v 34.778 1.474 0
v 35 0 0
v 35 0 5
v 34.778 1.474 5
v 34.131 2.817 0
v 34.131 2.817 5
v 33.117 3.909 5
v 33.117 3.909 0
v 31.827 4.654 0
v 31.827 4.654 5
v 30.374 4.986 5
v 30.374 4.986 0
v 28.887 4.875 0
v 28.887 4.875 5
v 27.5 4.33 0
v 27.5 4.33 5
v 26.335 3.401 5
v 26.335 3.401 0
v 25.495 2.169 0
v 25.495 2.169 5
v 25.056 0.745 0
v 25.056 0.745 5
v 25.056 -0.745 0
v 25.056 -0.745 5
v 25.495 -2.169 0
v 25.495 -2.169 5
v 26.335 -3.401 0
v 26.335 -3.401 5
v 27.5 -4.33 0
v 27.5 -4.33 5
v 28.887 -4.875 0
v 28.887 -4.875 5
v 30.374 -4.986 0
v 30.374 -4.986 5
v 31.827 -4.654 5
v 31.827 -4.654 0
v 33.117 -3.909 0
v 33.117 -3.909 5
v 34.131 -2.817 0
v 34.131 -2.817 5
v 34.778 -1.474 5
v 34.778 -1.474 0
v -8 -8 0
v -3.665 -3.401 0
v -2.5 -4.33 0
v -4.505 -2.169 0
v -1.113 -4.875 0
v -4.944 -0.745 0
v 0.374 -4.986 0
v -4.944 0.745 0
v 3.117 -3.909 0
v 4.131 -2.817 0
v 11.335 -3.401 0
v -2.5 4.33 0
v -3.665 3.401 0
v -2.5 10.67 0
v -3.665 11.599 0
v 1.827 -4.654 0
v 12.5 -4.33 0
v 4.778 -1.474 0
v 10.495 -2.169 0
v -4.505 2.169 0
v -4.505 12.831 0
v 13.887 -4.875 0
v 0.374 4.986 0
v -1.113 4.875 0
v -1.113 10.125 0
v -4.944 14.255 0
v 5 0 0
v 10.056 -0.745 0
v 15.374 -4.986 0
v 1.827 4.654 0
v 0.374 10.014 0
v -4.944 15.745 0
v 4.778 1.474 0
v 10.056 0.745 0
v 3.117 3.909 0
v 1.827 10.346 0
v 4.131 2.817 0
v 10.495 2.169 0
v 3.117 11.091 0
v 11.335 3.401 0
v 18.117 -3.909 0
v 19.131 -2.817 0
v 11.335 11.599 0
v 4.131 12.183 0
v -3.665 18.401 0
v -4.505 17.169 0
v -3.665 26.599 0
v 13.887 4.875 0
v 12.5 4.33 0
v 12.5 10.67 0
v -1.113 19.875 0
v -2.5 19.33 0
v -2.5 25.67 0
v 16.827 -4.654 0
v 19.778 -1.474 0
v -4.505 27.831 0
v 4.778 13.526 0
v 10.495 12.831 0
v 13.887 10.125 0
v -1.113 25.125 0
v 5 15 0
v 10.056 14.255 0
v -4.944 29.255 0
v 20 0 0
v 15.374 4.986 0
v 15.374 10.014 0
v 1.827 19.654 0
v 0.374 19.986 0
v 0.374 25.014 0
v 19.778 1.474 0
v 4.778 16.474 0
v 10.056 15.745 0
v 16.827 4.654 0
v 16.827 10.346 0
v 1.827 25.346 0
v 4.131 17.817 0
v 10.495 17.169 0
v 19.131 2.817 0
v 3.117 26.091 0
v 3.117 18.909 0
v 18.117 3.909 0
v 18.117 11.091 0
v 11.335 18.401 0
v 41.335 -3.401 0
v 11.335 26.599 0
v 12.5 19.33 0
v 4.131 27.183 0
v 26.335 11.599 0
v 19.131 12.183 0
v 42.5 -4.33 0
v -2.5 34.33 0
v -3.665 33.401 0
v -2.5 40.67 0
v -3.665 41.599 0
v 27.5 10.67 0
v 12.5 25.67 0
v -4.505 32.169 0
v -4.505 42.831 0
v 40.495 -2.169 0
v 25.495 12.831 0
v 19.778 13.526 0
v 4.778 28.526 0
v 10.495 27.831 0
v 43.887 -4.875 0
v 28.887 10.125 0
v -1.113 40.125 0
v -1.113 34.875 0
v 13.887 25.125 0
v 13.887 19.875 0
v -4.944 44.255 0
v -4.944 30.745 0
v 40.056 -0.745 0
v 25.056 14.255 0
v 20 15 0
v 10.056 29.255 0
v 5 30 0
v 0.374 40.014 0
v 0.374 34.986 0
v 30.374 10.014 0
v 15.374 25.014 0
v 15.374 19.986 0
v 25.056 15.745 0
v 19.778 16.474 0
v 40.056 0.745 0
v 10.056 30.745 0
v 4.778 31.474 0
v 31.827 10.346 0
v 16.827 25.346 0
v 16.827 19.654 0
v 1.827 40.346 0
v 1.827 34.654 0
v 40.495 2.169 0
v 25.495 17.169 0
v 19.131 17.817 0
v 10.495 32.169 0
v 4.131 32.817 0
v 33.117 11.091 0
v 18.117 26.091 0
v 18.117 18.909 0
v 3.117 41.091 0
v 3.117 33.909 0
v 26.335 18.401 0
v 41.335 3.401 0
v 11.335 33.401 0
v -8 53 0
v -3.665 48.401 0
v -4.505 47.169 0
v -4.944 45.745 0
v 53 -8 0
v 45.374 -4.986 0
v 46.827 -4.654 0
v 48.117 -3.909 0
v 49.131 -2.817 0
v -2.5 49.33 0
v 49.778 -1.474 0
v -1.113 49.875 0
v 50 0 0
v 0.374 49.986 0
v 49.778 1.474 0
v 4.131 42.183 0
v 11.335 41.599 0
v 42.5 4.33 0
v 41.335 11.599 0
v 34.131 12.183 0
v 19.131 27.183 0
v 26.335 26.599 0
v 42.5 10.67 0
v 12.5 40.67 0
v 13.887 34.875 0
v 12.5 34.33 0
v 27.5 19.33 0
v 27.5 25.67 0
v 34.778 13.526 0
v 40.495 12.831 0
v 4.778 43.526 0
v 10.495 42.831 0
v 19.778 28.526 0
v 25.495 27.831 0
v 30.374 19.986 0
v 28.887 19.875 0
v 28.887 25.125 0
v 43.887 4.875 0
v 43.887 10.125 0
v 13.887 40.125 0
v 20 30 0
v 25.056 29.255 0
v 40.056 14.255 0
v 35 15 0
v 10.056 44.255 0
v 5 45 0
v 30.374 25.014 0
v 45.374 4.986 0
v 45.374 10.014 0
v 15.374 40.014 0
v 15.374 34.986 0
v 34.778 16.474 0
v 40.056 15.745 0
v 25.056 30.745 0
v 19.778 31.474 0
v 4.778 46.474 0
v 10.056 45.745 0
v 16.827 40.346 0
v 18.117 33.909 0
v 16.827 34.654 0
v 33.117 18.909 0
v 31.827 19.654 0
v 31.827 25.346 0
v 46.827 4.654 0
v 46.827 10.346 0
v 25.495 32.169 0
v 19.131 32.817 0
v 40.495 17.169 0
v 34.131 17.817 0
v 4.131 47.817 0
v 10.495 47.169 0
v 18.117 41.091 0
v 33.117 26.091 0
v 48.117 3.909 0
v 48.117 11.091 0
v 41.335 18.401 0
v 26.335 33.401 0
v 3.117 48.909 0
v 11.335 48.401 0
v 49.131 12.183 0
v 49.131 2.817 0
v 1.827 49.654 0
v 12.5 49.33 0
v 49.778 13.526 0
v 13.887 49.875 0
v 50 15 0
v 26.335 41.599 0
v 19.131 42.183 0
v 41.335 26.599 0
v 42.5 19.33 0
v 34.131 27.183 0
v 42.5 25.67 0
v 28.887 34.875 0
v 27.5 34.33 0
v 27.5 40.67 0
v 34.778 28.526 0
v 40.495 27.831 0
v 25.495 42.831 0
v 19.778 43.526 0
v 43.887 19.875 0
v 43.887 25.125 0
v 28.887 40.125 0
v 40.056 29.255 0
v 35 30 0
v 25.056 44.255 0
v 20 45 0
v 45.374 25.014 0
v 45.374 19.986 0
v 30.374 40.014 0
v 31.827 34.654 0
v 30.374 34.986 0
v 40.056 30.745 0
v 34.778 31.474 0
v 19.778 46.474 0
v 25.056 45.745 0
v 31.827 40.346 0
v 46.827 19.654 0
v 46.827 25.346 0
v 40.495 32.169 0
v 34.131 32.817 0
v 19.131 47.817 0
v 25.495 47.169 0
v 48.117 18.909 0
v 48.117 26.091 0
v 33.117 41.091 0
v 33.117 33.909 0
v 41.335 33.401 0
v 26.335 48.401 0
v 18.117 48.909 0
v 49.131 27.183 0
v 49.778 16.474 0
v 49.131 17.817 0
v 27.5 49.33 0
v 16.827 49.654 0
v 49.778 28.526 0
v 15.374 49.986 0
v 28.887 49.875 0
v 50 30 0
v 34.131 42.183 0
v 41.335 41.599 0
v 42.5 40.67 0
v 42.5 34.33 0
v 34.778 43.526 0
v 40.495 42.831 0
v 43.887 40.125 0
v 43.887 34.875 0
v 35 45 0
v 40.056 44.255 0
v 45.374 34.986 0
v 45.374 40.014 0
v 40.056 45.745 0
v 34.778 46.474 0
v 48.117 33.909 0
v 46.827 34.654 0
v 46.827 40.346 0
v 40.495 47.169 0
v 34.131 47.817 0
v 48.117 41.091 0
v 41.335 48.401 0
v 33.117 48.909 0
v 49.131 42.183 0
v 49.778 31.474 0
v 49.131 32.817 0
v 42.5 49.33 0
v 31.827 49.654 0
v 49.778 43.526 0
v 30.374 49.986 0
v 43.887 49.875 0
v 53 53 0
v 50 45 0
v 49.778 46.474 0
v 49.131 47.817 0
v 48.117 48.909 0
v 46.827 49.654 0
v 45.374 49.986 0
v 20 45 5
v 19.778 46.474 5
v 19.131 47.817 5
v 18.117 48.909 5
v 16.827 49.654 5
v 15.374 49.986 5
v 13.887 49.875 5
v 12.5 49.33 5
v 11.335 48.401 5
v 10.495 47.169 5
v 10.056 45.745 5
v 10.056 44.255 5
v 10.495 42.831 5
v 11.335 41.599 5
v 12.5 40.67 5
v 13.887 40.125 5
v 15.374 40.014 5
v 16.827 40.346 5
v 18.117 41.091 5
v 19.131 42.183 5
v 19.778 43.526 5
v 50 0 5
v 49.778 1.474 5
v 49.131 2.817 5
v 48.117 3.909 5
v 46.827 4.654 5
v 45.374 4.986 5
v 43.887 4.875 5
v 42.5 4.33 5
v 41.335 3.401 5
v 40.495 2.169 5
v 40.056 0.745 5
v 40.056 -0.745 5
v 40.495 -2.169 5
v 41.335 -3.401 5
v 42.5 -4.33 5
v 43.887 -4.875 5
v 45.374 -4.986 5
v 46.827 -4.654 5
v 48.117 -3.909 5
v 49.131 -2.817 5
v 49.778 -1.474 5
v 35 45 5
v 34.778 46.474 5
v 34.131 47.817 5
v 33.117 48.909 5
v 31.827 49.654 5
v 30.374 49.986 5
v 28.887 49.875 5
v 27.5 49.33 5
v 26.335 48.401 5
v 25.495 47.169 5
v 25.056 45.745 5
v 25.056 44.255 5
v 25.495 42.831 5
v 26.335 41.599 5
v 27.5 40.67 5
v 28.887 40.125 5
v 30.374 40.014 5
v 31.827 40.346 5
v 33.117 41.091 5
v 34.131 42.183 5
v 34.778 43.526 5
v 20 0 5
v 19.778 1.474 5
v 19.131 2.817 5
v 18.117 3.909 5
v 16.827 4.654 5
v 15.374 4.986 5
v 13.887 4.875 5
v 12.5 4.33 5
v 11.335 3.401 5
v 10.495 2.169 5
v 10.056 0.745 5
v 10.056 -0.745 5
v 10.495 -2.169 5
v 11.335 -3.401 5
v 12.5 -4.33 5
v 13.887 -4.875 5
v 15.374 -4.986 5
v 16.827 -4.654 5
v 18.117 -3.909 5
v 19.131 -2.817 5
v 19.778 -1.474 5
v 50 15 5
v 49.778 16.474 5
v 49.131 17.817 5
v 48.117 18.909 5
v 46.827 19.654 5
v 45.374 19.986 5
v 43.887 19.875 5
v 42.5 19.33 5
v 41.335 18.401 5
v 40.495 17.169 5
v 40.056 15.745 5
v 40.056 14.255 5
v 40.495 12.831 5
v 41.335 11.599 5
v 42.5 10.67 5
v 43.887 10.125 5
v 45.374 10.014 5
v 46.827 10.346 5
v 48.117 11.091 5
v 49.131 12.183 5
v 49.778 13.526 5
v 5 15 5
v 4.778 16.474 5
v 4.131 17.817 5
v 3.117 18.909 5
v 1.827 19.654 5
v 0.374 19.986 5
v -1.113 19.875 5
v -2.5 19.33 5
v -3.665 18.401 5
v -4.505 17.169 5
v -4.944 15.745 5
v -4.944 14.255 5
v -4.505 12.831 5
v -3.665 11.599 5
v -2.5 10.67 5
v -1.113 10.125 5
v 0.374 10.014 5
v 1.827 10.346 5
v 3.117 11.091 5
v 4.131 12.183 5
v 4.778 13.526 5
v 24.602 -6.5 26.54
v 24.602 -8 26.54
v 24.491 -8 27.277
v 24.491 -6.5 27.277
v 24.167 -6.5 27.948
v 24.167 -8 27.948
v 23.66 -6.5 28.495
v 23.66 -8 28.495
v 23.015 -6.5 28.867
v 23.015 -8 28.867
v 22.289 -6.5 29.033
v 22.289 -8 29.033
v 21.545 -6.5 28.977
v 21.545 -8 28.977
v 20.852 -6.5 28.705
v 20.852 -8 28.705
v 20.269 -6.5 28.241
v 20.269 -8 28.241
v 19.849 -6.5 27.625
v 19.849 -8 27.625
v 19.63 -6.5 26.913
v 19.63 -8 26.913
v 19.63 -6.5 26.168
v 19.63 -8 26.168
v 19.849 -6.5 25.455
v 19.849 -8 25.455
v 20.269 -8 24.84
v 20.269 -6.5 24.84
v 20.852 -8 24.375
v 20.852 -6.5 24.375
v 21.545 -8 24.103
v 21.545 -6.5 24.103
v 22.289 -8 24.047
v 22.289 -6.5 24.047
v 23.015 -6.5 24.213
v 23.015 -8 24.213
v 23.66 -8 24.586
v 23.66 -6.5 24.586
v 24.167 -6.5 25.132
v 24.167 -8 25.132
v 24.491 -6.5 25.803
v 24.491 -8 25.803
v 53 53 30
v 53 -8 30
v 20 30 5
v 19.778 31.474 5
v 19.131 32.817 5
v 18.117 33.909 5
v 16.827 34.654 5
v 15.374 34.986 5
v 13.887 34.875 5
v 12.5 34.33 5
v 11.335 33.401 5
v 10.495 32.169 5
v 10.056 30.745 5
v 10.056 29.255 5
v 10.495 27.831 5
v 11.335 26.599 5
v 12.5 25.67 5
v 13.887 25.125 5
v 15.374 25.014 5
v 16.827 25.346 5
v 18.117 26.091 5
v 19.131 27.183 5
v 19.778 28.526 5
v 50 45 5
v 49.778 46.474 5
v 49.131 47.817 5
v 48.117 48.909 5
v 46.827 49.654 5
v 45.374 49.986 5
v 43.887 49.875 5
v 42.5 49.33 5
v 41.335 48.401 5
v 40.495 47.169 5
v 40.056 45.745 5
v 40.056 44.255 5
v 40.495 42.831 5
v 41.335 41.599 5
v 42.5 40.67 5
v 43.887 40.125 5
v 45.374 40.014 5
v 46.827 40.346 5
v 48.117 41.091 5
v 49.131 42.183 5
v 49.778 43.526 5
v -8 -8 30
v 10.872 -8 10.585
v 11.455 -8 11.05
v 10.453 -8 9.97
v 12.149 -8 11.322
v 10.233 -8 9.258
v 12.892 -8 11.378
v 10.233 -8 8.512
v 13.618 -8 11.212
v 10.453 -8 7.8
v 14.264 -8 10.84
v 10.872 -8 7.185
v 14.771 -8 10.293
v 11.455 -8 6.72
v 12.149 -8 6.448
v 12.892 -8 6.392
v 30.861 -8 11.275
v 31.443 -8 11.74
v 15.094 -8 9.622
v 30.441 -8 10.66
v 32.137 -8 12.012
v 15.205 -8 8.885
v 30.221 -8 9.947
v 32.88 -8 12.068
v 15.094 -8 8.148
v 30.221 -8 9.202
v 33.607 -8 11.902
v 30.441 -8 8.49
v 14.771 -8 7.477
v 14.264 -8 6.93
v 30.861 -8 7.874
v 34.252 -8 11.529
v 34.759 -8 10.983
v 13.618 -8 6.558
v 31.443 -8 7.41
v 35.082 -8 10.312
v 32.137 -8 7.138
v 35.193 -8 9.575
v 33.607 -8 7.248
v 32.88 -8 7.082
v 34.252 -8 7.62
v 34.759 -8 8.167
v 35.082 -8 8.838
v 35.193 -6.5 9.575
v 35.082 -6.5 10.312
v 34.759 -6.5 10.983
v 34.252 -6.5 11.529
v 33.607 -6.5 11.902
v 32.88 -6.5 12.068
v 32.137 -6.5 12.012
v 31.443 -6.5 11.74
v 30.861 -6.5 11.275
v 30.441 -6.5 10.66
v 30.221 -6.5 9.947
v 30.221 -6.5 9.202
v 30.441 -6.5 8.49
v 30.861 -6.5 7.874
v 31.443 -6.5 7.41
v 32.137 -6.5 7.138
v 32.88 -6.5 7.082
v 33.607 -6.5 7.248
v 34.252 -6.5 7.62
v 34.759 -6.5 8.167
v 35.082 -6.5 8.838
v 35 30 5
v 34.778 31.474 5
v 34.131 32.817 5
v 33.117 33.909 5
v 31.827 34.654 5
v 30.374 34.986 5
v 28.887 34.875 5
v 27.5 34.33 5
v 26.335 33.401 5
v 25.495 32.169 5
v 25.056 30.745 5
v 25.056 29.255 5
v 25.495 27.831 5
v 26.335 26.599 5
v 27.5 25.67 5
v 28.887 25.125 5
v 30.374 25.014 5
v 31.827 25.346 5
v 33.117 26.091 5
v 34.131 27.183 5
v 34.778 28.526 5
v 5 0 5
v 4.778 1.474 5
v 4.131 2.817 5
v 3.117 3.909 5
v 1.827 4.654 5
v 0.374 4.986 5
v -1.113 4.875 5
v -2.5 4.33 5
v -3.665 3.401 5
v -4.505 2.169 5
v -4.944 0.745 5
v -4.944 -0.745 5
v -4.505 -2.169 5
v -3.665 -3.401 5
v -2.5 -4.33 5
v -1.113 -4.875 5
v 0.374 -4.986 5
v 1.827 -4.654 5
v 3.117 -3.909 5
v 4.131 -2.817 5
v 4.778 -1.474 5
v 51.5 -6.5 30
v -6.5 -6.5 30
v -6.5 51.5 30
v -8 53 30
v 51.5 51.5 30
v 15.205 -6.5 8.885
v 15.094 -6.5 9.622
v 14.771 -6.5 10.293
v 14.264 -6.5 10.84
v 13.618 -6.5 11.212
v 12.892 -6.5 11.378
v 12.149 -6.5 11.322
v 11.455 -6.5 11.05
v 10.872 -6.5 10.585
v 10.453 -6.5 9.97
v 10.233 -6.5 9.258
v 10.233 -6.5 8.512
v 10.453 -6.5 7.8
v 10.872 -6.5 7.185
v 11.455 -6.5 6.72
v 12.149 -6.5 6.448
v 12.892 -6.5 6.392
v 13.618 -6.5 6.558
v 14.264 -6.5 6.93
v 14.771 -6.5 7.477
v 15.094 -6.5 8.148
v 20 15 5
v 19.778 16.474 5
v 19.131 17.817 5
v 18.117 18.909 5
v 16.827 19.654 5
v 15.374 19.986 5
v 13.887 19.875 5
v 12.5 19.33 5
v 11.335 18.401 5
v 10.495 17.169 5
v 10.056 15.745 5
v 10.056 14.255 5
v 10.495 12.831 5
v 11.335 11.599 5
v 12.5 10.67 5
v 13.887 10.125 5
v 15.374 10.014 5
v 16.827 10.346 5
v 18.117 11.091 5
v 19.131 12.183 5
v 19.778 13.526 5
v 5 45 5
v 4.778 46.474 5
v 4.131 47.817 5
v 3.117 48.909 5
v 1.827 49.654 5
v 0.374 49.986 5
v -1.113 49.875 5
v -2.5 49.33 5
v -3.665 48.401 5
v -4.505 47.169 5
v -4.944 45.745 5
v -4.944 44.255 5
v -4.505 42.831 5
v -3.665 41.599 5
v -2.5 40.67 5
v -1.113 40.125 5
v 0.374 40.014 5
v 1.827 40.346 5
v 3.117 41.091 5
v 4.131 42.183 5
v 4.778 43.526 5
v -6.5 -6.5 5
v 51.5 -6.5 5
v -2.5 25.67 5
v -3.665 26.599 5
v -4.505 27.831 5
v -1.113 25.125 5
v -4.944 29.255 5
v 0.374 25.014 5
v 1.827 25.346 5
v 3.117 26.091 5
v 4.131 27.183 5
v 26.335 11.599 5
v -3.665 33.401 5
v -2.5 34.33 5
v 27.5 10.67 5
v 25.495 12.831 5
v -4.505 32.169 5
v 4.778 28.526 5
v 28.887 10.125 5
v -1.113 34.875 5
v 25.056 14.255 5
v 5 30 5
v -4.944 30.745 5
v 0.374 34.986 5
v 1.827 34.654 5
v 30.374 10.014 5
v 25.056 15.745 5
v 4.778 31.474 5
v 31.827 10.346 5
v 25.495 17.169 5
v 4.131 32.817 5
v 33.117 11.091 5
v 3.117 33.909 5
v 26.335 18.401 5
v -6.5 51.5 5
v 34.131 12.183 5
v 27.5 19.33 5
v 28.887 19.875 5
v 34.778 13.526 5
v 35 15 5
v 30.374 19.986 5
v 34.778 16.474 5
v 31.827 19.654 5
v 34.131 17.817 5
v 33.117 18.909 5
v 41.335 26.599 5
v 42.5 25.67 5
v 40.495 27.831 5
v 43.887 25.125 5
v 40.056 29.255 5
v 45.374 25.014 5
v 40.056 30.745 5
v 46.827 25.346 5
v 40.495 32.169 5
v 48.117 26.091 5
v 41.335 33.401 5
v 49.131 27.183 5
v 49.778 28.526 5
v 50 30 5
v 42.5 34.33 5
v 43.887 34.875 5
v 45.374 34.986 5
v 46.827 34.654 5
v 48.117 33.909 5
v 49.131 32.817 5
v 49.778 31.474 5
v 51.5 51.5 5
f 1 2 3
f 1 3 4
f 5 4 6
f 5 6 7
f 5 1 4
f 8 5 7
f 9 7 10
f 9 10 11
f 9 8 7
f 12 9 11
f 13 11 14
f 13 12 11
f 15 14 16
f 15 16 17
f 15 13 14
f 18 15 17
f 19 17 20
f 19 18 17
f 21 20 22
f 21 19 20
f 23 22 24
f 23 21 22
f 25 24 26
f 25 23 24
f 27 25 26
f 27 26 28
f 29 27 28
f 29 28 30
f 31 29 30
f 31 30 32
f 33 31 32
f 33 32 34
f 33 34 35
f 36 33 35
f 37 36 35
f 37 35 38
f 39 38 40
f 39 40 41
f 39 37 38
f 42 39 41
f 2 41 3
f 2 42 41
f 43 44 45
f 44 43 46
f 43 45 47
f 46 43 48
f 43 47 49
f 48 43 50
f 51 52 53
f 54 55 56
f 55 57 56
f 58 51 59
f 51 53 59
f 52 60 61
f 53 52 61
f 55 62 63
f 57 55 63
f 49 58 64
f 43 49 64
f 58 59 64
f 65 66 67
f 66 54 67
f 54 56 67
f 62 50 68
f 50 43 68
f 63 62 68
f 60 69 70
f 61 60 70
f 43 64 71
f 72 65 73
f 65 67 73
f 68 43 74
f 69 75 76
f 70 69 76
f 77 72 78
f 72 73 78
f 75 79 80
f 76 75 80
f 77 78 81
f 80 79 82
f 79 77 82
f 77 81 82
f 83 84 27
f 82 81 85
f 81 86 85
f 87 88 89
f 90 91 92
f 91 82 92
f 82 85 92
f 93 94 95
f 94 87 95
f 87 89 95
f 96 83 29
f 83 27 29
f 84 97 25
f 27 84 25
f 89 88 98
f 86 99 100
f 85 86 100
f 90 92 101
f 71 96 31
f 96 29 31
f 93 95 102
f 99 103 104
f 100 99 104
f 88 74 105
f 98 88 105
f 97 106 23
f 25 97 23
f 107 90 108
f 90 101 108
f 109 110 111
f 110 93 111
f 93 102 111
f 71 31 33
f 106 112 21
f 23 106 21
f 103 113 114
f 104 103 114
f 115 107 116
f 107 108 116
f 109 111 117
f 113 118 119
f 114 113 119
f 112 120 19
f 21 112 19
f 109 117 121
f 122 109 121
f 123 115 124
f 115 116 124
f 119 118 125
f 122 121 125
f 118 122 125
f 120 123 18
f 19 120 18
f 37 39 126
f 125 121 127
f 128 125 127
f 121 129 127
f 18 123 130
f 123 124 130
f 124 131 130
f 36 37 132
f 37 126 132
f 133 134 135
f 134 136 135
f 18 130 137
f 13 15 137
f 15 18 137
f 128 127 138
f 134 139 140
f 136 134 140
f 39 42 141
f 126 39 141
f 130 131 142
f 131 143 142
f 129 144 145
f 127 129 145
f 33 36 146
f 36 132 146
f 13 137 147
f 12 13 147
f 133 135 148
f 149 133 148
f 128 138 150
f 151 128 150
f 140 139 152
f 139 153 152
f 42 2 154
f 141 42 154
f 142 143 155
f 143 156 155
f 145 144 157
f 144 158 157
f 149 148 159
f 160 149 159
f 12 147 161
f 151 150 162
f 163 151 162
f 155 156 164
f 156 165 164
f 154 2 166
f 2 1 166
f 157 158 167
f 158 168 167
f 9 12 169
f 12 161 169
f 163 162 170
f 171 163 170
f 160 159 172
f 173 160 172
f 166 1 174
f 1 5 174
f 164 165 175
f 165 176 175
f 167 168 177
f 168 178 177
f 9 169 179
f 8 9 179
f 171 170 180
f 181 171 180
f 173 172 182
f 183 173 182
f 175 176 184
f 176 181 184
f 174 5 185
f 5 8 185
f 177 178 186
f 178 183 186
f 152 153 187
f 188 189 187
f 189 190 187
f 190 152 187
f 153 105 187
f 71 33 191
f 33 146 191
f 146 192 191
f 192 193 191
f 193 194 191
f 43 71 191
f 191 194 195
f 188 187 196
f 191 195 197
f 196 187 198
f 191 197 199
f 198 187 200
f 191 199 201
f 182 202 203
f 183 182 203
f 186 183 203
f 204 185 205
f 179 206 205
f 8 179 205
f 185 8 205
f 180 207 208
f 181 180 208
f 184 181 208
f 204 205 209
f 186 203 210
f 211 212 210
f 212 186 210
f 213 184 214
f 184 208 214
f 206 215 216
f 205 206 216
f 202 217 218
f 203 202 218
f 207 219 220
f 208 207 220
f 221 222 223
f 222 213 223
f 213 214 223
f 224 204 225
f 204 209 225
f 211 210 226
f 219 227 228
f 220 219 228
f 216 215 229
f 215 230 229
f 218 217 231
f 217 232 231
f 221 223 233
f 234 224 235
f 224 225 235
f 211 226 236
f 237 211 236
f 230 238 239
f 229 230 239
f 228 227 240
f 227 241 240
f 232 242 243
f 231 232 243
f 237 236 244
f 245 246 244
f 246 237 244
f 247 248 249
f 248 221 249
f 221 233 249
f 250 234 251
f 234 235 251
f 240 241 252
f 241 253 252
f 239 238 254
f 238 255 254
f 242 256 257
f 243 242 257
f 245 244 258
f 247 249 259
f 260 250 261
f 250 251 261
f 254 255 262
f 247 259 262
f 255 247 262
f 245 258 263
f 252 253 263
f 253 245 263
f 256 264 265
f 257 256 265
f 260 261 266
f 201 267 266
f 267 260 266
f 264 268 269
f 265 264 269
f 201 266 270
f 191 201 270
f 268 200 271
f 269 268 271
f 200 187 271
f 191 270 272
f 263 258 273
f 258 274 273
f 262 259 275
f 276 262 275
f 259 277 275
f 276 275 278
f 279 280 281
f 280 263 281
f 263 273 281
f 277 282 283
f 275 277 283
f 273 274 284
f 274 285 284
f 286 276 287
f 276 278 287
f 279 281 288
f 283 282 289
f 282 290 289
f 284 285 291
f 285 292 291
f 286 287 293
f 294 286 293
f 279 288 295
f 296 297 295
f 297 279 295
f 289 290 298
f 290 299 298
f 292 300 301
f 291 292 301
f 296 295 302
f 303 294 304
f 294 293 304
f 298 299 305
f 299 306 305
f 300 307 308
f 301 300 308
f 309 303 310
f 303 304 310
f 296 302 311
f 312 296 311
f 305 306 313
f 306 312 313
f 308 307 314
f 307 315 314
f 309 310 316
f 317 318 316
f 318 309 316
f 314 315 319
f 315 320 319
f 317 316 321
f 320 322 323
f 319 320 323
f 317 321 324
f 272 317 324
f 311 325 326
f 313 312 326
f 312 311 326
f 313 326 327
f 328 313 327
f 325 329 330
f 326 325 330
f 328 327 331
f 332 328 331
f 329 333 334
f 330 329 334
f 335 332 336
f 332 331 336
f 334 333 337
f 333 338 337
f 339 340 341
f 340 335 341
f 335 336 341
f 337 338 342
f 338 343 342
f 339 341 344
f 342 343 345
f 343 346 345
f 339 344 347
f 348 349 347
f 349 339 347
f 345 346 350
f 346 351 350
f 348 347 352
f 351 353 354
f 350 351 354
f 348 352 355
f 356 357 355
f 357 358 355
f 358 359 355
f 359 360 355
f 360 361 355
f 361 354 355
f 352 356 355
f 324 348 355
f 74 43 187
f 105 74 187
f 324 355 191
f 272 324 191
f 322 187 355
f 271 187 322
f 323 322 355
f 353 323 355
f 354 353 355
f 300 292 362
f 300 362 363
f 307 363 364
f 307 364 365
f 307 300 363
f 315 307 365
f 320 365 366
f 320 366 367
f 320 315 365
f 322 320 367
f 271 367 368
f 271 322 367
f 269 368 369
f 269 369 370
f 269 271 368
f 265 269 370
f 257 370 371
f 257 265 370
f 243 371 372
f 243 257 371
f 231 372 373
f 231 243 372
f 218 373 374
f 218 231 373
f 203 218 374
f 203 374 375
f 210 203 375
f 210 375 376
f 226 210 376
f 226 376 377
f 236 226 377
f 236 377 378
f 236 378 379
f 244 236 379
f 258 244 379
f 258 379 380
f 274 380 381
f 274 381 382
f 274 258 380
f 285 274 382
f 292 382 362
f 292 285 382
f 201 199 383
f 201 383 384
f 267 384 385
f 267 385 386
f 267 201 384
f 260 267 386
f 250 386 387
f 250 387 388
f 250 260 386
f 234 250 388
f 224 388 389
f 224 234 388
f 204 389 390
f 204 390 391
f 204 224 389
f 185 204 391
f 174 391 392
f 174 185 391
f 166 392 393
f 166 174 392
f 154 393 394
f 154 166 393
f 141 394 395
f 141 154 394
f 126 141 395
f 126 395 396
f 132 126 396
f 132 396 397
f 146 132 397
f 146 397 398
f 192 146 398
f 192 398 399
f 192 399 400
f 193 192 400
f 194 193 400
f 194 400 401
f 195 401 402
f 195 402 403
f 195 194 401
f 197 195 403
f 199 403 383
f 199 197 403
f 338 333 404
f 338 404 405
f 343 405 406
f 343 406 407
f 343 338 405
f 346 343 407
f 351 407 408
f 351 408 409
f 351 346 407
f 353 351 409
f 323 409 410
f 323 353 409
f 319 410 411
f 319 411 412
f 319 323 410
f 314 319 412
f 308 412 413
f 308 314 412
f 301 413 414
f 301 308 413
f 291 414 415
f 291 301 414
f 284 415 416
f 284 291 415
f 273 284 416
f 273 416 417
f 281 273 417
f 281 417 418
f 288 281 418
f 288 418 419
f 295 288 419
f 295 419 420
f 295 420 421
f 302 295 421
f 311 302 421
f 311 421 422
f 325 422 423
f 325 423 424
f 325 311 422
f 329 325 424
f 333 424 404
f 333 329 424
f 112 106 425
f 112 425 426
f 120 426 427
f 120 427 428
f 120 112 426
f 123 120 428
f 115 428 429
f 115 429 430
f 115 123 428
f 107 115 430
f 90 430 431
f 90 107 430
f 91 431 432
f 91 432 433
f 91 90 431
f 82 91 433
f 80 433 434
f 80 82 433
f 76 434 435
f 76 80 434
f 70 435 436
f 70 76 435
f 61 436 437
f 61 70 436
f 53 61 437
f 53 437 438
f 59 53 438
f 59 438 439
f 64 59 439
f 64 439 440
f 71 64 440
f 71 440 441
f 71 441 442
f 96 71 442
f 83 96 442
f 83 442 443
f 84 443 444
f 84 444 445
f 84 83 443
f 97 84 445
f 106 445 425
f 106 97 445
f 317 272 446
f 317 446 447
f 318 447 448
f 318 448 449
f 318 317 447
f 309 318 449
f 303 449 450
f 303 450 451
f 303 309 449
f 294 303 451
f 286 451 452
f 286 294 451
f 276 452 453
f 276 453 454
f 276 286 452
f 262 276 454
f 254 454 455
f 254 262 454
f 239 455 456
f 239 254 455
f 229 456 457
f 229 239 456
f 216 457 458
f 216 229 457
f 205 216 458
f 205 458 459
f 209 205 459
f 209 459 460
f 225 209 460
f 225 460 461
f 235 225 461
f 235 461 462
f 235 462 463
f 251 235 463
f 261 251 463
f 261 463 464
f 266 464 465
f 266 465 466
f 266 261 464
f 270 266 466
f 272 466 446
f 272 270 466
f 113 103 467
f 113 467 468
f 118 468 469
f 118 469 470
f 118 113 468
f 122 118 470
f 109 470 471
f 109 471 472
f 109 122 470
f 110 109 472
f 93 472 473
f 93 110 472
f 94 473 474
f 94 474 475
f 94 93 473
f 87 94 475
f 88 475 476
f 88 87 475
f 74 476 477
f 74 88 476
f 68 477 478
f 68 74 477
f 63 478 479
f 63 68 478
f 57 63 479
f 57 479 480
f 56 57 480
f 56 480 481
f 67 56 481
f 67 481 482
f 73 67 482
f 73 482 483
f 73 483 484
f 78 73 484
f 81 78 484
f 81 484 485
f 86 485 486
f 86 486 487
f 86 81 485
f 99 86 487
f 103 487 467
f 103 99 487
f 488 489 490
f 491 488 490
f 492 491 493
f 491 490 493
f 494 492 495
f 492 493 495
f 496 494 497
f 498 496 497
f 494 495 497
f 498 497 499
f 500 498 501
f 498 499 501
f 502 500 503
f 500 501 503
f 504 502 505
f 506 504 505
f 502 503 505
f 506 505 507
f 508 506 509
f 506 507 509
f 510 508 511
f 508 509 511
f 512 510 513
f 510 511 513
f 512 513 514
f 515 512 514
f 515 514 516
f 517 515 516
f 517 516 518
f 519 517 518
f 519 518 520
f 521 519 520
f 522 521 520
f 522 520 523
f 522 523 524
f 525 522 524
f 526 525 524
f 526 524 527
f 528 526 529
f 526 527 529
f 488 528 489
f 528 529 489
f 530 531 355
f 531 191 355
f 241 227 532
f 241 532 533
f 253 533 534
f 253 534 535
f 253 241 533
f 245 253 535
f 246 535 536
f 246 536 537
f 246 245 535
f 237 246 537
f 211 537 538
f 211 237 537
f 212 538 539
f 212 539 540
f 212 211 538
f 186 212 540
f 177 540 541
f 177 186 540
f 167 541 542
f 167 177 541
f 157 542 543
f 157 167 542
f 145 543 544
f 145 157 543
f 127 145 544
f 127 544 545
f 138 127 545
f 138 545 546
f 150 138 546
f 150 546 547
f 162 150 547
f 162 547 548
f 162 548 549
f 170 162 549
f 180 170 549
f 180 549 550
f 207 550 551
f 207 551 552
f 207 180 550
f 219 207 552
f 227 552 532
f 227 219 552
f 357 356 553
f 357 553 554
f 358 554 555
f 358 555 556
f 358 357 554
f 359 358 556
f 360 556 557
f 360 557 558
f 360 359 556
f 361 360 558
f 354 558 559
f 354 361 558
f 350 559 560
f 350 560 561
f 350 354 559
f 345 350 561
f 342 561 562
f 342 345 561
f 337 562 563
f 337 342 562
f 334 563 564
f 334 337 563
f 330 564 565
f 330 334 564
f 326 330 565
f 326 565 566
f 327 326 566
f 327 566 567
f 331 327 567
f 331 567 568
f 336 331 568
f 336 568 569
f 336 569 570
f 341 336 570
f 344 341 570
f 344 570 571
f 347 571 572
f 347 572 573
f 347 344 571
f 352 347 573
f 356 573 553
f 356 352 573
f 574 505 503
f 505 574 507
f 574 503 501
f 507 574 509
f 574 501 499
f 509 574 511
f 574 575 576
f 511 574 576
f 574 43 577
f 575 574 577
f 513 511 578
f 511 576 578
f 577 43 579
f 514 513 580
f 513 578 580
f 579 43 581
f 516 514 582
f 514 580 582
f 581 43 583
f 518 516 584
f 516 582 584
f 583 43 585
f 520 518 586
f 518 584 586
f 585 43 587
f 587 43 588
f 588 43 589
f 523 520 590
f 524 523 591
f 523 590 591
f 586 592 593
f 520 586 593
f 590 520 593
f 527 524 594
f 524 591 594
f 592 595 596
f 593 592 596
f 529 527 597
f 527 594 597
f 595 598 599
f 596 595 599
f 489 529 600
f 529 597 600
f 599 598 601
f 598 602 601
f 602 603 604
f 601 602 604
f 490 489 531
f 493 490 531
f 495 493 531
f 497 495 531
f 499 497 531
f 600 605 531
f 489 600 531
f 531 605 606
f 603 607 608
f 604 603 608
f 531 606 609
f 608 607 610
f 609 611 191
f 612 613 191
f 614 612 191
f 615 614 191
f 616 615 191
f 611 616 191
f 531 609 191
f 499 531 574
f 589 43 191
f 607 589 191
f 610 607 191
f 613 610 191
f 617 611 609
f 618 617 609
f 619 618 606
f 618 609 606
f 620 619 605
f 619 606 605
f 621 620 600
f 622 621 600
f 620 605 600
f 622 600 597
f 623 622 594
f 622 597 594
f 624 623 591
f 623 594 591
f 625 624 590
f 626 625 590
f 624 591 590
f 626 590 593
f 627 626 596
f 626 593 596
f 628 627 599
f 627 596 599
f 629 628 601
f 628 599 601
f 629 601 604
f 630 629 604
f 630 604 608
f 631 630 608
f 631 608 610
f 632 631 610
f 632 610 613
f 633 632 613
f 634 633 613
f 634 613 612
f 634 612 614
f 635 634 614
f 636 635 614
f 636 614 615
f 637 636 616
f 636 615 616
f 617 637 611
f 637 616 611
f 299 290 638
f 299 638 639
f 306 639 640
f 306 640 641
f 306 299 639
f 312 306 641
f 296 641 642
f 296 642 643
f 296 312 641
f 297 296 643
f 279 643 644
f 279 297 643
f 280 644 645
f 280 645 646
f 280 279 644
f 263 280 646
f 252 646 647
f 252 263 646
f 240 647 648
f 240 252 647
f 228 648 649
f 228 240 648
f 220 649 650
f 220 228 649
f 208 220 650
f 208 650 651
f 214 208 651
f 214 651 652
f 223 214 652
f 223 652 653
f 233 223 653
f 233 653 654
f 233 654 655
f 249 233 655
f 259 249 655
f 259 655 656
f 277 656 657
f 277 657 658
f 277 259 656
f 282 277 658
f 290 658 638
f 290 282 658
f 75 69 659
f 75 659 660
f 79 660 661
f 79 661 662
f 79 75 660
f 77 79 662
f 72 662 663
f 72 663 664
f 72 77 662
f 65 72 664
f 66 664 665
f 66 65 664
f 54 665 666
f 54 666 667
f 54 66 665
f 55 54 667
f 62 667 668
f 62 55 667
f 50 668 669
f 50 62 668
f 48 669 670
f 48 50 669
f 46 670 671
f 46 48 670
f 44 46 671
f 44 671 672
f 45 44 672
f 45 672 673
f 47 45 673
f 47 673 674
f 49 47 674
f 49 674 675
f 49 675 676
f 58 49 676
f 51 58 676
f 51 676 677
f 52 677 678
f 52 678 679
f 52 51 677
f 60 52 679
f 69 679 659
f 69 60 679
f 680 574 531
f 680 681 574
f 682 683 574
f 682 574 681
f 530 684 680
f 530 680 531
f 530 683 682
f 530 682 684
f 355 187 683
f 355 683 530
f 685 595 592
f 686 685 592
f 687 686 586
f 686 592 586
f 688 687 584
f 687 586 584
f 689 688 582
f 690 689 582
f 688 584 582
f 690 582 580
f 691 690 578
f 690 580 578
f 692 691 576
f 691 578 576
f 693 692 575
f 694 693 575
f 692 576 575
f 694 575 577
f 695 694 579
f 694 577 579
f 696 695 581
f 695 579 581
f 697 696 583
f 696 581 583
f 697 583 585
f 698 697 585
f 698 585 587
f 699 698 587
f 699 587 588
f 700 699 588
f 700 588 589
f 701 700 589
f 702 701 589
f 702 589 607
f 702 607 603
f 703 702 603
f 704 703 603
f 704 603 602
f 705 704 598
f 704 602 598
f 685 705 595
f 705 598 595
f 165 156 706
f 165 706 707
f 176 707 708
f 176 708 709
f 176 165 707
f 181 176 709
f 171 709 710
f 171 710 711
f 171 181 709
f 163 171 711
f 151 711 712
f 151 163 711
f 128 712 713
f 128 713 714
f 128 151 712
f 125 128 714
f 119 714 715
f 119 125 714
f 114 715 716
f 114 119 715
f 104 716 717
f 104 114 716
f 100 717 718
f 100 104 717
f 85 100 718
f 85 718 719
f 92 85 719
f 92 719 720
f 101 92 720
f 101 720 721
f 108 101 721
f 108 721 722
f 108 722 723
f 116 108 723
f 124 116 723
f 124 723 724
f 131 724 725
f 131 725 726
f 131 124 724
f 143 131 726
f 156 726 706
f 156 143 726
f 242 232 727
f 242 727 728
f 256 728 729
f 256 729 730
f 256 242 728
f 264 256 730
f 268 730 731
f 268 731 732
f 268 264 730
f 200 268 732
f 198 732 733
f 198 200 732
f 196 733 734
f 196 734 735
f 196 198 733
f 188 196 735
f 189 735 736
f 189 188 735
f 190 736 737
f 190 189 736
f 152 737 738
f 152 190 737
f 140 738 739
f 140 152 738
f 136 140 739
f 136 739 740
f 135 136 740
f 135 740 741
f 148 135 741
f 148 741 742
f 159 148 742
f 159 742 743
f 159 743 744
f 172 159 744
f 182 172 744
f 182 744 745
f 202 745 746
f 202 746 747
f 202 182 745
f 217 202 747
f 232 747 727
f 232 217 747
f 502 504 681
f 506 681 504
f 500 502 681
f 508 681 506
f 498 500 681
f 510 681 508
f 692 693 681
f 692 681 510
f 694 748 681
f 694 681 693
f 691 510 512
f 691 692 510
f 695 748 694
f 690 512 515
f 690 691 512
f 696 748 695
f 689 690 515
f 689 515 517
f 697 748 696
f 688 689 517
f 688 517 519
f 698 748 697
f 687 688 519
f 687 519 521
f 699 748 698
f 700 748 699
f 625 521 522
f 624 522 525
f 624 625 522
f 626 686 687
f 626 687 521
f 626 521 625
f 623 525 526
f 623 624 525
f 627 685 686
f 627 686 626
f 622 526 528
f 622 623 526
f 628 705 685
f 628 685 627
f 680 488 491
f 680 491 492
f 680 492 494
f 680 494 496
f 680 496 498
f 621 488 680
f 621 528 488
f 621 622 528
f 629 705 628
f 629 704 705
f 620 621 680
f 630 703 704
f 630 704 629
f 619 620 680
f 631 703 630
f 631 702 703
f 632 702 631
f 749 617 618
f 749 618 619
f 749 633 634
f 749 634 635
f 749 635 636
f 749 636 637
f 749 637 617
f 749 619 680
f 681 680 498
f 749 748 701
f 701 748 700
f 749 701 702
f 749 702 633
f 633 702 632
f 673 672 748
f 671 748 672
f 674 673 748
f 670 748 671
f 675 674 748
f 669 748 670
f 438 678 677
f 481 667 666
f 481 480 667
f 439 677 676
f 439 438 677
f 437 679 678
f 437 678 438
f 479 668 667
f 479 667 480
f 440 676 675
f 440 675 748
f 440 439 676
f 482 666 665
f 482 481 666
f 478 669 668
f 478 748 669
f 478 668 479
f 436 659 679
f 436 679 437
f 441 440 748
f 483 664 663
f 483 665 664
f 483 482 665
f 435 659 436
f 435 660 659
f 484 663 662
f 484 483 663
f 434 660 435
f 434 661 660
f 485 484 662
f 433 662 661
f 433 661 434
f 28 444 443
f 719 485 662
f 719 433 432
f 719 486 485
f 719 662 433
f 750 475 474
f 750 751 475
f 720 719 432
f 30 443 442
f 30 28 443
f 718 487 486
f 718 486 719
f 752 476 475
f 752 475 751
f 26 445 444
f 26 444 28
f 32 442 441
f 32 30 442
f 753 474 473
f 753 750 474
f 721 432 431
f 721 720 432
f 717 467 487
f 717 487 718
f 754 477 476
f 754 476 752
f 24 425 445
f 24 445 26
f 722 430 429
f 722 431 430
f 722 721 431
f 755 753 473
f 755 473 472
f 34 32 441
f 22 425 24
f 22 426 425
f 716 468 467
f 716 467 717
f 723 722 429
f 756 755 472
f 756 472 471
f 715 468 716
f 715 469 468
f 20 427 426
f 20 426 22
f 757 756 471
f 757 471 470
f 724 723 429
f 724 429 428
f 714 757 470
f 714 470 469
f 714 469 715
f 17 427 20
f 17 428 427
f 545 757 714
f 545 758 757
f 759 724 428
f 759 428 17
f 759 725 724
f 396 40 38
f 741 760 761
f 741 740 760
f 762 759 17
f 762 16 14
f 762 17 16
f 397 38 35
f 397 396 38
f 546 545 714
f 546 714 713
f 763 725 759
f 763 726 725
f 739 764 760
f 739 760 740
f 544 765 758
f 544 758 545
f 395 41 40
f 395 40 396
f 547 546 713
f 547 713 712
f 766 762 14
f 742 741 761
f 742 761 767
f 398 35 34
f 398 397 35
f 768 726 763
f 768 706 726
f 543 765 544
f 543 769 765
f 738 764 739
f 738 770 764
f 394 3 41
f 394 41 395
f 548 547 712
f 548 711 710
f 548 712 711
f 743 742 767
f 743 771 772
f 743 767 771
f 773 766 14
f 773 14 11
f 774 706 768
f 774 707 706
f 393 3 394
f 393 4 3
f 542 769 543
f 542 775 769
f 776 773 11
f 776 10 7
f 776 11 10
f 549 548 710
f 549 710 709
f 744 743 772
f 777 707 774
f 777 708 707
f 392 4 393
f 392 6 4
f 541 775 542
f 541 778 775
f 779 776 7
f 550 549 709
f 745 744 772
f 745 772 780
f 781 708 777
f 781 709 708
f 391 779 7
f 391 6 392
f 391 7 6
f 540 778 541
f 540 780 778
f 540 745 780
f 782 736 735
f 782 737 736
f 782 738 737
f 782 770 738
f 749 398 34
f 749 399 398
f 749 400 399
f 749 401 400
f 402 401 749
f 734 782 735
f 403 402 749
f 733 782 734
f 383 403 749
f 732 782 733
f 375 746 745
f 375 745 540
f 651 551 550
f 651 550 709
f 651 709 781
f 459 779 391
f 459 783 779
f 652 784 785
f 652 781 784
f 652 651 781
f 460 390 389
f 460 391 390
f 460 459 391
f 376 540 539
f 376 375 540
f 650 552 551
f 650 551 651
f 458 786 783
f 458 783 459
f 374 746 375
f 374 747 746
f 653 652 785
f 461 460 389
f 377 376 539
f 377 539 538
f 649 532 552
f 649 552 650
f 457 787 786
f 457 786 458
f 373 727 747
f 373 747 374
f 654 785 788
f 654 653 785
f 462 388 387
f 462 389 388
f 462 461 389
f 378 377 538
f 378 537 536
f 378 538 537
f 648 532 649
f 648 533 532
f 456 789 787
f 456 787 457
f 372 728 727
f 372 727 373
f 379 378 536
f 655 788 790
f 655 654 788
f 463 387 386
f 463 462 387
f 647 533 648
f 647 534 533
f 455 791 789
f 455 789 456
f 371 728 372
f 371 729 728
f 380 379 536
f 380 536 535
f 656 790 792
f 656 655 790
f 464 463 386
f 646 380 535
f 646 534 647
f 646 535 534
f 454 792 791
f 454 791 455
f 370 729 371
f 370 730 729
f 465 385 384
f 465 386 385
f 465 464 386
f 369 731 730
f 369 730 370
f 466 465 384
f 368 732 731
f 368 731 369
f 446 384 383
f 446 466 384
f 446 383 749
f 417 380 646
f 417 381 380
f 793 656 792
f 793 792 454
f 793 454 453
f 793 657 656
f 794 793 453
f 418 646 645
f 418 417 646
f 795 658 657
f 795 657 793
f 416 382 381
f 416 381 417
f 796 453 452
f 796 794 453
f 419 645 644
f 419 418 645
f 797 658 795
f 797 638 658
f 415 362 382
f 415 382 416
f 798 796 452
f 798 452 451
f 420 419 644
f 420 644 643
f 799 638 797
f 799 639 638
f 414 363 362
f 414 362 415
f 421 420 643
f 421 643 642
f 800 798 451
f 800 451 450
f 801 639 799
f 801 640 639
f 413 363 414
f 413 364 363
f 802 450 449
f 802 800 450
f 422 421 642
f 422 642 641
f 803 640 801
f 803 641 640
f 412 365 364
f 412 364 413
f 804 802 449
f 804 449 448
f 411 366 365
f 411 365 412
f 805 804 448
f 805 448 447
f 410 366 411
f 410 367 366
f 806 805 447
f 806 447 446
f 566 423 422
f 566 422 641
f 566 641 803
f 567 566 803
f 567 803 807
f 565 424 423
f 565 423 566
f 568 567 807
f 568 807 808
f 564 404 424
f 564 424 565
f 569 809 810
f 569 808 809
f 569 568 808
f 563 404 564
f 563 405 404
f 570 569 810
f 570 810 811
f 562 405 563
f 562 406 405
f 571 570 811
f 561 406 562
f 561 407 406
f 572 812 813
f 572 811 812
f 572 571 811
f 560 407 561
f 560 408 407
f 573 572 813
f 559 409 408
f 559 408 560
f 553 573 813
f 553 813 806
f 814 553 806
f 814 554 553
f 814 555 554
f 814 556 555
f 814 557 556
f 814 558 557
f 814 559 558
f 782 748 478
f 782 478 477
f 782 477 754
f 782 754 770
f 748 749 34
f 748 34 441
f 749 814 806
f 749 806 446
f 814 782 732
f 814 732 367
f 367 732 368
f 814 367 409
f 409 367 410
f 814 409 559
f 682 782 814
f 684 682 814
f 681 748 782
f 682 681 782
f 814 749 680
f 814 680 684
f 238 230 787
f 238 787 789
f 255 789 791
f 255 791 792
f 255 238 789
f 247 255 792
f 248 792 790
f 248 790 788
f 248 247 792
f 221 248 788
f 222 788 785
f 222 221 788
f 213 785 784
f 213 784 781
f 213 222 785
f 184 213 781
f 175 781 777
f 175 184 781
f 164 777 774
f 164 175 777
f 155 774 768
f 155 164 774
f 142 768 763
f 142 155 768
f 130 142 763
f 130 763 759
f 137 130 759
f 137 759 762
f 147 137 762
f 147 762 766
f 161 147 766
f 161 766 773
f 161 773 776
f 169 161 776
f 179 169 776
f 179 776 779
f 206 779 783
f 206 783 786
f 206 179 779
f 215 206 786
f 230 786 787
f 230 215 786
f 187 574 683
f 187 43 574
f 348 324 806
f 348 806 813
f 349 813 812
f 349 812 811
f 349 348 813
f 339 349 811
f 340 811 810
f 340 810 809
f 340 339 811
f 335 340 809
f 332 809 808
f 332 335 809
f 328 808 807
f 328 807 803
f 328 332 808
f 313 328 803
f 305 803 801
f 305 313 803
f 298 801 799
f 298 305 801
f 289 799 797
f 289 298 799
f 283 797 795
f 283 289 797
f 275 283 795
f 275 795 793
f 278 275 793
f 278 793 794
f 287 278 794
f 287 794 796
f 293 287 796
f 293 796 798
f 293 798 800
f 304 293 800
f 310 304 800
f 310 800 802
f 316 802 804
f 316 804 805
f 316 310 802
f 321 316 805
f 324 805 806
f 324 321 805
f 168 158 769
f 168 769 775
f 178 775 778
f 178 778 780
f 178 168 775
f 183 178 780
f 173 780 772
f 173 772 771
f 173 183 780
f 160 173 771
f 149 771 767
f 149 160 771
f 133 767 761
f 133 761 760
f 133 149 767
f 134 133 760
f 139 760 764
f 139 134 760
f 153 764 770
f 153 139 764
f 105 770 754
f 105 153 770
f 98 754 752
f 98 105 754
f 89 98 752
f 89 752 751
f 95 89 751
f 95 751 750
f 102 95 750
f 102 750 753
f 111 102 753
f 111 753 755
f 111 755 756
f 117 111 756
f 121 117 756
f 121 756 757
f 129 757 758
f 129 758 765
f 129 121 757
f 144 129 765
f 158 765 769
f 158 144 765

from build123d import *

# Parameters (mm, degrees)
F0_W     = 61
F0_H     = 61
F0_R     = 5
F1_DEPTH = 5
F2_W     = 61
F2_H     = 61
F2_W_2   = 58
F2_H_2   = 58
F3_DEPTH = 25
F4_R     = 2.5
F5_DEPTH = 1.5


with BuildPart() as f1:
    # F0 (on Top) → F1 (new body)
    with BuildSketch(Plane.XY):
        with Locations((22.5, 22.5)):
            Rectangle(F0_W, F0_H)
        Circle(F0_R, mode=Mode.SUBTRACT)
        with Locations((15, 0)):
            Circle(F0_R, mode=Mode.SUBTRACT)
        with Locations((0, 15)):
            Circle(F0_R, mode=Mode.SUBTRACT)
        with Locations((15, 15)):
            Circle(F0_R, mode=Mode.SUBTRACT)
        with Locations((30, 0)):
            Circle(F0_R, mode=Mode.SUBTRACT)
        with Locations((45, 0)):
            Circle(F0_R, mode=Mode.SUBTRACT)
        with Locations((30, 15)):
            Circle(F0_R, mode=Mode.SUBTRACT)
        with Locations((45, 15)):
            Circle(F0_R, mode=Mode.SUBTRACT)
        with Locations((0, 30)):
            Circle(F0_R, mode=Mode.SUBTRACT)
        with Locations((15, 30)):
            Circle(F0_R, mode=Mode.SUBTRACT)
        with Locations((0, 45)):
            Circle(F0_R, mode=Mode.SUBTRACT)
        with Locations((15, 45)):
            Circle(F0_R, mode=Mode.SUBTRACT)
        with Locations((30, 30)):
            Circle(F0_R, mode=Mode.SUBTRACT)
        with Locations((45, 30)):
            Circle(F0_R, mode=Mode.SUBTRACT)
        with Locations((30, 45)):
            Circle(F0_R, mode=Mode.SUBTRACT)
        with Locations((45, 45)):
            Circle(F0_R, mode=Mode.SUBTRACT)
    extrude(amount=F1_DEPTH)

    # F2 (on face) → F3 (join)
    with BuildSketch(Plane.XY.offset(5)):
        with Locations((22.5, 22.5)):
            Rectangle(F2_W, F2_H)
        with Locations((22.5, 22.5)):
            Rectangle(F2_W_2, F2_H_2, mode=Mode.SUBTRACT)
    extrude(amount=F3_DEPTH)

    # F4 (on face) → F5 (cut, through all)
    with BuildSketch(Plane.XZ.offset(8)):
        with Locations((22.101691, 26.540134)):
            Circle(F4_R)
        with Locations((12.705106, 8.884987)):
            Circle(F4_R)
        with Locations((32.693203, 9.574879)):
            Circle(F4_R)
    extrude(amount=-F5_DEPTH, mode=Mode.SUBTRACT)


solid = f1.part
